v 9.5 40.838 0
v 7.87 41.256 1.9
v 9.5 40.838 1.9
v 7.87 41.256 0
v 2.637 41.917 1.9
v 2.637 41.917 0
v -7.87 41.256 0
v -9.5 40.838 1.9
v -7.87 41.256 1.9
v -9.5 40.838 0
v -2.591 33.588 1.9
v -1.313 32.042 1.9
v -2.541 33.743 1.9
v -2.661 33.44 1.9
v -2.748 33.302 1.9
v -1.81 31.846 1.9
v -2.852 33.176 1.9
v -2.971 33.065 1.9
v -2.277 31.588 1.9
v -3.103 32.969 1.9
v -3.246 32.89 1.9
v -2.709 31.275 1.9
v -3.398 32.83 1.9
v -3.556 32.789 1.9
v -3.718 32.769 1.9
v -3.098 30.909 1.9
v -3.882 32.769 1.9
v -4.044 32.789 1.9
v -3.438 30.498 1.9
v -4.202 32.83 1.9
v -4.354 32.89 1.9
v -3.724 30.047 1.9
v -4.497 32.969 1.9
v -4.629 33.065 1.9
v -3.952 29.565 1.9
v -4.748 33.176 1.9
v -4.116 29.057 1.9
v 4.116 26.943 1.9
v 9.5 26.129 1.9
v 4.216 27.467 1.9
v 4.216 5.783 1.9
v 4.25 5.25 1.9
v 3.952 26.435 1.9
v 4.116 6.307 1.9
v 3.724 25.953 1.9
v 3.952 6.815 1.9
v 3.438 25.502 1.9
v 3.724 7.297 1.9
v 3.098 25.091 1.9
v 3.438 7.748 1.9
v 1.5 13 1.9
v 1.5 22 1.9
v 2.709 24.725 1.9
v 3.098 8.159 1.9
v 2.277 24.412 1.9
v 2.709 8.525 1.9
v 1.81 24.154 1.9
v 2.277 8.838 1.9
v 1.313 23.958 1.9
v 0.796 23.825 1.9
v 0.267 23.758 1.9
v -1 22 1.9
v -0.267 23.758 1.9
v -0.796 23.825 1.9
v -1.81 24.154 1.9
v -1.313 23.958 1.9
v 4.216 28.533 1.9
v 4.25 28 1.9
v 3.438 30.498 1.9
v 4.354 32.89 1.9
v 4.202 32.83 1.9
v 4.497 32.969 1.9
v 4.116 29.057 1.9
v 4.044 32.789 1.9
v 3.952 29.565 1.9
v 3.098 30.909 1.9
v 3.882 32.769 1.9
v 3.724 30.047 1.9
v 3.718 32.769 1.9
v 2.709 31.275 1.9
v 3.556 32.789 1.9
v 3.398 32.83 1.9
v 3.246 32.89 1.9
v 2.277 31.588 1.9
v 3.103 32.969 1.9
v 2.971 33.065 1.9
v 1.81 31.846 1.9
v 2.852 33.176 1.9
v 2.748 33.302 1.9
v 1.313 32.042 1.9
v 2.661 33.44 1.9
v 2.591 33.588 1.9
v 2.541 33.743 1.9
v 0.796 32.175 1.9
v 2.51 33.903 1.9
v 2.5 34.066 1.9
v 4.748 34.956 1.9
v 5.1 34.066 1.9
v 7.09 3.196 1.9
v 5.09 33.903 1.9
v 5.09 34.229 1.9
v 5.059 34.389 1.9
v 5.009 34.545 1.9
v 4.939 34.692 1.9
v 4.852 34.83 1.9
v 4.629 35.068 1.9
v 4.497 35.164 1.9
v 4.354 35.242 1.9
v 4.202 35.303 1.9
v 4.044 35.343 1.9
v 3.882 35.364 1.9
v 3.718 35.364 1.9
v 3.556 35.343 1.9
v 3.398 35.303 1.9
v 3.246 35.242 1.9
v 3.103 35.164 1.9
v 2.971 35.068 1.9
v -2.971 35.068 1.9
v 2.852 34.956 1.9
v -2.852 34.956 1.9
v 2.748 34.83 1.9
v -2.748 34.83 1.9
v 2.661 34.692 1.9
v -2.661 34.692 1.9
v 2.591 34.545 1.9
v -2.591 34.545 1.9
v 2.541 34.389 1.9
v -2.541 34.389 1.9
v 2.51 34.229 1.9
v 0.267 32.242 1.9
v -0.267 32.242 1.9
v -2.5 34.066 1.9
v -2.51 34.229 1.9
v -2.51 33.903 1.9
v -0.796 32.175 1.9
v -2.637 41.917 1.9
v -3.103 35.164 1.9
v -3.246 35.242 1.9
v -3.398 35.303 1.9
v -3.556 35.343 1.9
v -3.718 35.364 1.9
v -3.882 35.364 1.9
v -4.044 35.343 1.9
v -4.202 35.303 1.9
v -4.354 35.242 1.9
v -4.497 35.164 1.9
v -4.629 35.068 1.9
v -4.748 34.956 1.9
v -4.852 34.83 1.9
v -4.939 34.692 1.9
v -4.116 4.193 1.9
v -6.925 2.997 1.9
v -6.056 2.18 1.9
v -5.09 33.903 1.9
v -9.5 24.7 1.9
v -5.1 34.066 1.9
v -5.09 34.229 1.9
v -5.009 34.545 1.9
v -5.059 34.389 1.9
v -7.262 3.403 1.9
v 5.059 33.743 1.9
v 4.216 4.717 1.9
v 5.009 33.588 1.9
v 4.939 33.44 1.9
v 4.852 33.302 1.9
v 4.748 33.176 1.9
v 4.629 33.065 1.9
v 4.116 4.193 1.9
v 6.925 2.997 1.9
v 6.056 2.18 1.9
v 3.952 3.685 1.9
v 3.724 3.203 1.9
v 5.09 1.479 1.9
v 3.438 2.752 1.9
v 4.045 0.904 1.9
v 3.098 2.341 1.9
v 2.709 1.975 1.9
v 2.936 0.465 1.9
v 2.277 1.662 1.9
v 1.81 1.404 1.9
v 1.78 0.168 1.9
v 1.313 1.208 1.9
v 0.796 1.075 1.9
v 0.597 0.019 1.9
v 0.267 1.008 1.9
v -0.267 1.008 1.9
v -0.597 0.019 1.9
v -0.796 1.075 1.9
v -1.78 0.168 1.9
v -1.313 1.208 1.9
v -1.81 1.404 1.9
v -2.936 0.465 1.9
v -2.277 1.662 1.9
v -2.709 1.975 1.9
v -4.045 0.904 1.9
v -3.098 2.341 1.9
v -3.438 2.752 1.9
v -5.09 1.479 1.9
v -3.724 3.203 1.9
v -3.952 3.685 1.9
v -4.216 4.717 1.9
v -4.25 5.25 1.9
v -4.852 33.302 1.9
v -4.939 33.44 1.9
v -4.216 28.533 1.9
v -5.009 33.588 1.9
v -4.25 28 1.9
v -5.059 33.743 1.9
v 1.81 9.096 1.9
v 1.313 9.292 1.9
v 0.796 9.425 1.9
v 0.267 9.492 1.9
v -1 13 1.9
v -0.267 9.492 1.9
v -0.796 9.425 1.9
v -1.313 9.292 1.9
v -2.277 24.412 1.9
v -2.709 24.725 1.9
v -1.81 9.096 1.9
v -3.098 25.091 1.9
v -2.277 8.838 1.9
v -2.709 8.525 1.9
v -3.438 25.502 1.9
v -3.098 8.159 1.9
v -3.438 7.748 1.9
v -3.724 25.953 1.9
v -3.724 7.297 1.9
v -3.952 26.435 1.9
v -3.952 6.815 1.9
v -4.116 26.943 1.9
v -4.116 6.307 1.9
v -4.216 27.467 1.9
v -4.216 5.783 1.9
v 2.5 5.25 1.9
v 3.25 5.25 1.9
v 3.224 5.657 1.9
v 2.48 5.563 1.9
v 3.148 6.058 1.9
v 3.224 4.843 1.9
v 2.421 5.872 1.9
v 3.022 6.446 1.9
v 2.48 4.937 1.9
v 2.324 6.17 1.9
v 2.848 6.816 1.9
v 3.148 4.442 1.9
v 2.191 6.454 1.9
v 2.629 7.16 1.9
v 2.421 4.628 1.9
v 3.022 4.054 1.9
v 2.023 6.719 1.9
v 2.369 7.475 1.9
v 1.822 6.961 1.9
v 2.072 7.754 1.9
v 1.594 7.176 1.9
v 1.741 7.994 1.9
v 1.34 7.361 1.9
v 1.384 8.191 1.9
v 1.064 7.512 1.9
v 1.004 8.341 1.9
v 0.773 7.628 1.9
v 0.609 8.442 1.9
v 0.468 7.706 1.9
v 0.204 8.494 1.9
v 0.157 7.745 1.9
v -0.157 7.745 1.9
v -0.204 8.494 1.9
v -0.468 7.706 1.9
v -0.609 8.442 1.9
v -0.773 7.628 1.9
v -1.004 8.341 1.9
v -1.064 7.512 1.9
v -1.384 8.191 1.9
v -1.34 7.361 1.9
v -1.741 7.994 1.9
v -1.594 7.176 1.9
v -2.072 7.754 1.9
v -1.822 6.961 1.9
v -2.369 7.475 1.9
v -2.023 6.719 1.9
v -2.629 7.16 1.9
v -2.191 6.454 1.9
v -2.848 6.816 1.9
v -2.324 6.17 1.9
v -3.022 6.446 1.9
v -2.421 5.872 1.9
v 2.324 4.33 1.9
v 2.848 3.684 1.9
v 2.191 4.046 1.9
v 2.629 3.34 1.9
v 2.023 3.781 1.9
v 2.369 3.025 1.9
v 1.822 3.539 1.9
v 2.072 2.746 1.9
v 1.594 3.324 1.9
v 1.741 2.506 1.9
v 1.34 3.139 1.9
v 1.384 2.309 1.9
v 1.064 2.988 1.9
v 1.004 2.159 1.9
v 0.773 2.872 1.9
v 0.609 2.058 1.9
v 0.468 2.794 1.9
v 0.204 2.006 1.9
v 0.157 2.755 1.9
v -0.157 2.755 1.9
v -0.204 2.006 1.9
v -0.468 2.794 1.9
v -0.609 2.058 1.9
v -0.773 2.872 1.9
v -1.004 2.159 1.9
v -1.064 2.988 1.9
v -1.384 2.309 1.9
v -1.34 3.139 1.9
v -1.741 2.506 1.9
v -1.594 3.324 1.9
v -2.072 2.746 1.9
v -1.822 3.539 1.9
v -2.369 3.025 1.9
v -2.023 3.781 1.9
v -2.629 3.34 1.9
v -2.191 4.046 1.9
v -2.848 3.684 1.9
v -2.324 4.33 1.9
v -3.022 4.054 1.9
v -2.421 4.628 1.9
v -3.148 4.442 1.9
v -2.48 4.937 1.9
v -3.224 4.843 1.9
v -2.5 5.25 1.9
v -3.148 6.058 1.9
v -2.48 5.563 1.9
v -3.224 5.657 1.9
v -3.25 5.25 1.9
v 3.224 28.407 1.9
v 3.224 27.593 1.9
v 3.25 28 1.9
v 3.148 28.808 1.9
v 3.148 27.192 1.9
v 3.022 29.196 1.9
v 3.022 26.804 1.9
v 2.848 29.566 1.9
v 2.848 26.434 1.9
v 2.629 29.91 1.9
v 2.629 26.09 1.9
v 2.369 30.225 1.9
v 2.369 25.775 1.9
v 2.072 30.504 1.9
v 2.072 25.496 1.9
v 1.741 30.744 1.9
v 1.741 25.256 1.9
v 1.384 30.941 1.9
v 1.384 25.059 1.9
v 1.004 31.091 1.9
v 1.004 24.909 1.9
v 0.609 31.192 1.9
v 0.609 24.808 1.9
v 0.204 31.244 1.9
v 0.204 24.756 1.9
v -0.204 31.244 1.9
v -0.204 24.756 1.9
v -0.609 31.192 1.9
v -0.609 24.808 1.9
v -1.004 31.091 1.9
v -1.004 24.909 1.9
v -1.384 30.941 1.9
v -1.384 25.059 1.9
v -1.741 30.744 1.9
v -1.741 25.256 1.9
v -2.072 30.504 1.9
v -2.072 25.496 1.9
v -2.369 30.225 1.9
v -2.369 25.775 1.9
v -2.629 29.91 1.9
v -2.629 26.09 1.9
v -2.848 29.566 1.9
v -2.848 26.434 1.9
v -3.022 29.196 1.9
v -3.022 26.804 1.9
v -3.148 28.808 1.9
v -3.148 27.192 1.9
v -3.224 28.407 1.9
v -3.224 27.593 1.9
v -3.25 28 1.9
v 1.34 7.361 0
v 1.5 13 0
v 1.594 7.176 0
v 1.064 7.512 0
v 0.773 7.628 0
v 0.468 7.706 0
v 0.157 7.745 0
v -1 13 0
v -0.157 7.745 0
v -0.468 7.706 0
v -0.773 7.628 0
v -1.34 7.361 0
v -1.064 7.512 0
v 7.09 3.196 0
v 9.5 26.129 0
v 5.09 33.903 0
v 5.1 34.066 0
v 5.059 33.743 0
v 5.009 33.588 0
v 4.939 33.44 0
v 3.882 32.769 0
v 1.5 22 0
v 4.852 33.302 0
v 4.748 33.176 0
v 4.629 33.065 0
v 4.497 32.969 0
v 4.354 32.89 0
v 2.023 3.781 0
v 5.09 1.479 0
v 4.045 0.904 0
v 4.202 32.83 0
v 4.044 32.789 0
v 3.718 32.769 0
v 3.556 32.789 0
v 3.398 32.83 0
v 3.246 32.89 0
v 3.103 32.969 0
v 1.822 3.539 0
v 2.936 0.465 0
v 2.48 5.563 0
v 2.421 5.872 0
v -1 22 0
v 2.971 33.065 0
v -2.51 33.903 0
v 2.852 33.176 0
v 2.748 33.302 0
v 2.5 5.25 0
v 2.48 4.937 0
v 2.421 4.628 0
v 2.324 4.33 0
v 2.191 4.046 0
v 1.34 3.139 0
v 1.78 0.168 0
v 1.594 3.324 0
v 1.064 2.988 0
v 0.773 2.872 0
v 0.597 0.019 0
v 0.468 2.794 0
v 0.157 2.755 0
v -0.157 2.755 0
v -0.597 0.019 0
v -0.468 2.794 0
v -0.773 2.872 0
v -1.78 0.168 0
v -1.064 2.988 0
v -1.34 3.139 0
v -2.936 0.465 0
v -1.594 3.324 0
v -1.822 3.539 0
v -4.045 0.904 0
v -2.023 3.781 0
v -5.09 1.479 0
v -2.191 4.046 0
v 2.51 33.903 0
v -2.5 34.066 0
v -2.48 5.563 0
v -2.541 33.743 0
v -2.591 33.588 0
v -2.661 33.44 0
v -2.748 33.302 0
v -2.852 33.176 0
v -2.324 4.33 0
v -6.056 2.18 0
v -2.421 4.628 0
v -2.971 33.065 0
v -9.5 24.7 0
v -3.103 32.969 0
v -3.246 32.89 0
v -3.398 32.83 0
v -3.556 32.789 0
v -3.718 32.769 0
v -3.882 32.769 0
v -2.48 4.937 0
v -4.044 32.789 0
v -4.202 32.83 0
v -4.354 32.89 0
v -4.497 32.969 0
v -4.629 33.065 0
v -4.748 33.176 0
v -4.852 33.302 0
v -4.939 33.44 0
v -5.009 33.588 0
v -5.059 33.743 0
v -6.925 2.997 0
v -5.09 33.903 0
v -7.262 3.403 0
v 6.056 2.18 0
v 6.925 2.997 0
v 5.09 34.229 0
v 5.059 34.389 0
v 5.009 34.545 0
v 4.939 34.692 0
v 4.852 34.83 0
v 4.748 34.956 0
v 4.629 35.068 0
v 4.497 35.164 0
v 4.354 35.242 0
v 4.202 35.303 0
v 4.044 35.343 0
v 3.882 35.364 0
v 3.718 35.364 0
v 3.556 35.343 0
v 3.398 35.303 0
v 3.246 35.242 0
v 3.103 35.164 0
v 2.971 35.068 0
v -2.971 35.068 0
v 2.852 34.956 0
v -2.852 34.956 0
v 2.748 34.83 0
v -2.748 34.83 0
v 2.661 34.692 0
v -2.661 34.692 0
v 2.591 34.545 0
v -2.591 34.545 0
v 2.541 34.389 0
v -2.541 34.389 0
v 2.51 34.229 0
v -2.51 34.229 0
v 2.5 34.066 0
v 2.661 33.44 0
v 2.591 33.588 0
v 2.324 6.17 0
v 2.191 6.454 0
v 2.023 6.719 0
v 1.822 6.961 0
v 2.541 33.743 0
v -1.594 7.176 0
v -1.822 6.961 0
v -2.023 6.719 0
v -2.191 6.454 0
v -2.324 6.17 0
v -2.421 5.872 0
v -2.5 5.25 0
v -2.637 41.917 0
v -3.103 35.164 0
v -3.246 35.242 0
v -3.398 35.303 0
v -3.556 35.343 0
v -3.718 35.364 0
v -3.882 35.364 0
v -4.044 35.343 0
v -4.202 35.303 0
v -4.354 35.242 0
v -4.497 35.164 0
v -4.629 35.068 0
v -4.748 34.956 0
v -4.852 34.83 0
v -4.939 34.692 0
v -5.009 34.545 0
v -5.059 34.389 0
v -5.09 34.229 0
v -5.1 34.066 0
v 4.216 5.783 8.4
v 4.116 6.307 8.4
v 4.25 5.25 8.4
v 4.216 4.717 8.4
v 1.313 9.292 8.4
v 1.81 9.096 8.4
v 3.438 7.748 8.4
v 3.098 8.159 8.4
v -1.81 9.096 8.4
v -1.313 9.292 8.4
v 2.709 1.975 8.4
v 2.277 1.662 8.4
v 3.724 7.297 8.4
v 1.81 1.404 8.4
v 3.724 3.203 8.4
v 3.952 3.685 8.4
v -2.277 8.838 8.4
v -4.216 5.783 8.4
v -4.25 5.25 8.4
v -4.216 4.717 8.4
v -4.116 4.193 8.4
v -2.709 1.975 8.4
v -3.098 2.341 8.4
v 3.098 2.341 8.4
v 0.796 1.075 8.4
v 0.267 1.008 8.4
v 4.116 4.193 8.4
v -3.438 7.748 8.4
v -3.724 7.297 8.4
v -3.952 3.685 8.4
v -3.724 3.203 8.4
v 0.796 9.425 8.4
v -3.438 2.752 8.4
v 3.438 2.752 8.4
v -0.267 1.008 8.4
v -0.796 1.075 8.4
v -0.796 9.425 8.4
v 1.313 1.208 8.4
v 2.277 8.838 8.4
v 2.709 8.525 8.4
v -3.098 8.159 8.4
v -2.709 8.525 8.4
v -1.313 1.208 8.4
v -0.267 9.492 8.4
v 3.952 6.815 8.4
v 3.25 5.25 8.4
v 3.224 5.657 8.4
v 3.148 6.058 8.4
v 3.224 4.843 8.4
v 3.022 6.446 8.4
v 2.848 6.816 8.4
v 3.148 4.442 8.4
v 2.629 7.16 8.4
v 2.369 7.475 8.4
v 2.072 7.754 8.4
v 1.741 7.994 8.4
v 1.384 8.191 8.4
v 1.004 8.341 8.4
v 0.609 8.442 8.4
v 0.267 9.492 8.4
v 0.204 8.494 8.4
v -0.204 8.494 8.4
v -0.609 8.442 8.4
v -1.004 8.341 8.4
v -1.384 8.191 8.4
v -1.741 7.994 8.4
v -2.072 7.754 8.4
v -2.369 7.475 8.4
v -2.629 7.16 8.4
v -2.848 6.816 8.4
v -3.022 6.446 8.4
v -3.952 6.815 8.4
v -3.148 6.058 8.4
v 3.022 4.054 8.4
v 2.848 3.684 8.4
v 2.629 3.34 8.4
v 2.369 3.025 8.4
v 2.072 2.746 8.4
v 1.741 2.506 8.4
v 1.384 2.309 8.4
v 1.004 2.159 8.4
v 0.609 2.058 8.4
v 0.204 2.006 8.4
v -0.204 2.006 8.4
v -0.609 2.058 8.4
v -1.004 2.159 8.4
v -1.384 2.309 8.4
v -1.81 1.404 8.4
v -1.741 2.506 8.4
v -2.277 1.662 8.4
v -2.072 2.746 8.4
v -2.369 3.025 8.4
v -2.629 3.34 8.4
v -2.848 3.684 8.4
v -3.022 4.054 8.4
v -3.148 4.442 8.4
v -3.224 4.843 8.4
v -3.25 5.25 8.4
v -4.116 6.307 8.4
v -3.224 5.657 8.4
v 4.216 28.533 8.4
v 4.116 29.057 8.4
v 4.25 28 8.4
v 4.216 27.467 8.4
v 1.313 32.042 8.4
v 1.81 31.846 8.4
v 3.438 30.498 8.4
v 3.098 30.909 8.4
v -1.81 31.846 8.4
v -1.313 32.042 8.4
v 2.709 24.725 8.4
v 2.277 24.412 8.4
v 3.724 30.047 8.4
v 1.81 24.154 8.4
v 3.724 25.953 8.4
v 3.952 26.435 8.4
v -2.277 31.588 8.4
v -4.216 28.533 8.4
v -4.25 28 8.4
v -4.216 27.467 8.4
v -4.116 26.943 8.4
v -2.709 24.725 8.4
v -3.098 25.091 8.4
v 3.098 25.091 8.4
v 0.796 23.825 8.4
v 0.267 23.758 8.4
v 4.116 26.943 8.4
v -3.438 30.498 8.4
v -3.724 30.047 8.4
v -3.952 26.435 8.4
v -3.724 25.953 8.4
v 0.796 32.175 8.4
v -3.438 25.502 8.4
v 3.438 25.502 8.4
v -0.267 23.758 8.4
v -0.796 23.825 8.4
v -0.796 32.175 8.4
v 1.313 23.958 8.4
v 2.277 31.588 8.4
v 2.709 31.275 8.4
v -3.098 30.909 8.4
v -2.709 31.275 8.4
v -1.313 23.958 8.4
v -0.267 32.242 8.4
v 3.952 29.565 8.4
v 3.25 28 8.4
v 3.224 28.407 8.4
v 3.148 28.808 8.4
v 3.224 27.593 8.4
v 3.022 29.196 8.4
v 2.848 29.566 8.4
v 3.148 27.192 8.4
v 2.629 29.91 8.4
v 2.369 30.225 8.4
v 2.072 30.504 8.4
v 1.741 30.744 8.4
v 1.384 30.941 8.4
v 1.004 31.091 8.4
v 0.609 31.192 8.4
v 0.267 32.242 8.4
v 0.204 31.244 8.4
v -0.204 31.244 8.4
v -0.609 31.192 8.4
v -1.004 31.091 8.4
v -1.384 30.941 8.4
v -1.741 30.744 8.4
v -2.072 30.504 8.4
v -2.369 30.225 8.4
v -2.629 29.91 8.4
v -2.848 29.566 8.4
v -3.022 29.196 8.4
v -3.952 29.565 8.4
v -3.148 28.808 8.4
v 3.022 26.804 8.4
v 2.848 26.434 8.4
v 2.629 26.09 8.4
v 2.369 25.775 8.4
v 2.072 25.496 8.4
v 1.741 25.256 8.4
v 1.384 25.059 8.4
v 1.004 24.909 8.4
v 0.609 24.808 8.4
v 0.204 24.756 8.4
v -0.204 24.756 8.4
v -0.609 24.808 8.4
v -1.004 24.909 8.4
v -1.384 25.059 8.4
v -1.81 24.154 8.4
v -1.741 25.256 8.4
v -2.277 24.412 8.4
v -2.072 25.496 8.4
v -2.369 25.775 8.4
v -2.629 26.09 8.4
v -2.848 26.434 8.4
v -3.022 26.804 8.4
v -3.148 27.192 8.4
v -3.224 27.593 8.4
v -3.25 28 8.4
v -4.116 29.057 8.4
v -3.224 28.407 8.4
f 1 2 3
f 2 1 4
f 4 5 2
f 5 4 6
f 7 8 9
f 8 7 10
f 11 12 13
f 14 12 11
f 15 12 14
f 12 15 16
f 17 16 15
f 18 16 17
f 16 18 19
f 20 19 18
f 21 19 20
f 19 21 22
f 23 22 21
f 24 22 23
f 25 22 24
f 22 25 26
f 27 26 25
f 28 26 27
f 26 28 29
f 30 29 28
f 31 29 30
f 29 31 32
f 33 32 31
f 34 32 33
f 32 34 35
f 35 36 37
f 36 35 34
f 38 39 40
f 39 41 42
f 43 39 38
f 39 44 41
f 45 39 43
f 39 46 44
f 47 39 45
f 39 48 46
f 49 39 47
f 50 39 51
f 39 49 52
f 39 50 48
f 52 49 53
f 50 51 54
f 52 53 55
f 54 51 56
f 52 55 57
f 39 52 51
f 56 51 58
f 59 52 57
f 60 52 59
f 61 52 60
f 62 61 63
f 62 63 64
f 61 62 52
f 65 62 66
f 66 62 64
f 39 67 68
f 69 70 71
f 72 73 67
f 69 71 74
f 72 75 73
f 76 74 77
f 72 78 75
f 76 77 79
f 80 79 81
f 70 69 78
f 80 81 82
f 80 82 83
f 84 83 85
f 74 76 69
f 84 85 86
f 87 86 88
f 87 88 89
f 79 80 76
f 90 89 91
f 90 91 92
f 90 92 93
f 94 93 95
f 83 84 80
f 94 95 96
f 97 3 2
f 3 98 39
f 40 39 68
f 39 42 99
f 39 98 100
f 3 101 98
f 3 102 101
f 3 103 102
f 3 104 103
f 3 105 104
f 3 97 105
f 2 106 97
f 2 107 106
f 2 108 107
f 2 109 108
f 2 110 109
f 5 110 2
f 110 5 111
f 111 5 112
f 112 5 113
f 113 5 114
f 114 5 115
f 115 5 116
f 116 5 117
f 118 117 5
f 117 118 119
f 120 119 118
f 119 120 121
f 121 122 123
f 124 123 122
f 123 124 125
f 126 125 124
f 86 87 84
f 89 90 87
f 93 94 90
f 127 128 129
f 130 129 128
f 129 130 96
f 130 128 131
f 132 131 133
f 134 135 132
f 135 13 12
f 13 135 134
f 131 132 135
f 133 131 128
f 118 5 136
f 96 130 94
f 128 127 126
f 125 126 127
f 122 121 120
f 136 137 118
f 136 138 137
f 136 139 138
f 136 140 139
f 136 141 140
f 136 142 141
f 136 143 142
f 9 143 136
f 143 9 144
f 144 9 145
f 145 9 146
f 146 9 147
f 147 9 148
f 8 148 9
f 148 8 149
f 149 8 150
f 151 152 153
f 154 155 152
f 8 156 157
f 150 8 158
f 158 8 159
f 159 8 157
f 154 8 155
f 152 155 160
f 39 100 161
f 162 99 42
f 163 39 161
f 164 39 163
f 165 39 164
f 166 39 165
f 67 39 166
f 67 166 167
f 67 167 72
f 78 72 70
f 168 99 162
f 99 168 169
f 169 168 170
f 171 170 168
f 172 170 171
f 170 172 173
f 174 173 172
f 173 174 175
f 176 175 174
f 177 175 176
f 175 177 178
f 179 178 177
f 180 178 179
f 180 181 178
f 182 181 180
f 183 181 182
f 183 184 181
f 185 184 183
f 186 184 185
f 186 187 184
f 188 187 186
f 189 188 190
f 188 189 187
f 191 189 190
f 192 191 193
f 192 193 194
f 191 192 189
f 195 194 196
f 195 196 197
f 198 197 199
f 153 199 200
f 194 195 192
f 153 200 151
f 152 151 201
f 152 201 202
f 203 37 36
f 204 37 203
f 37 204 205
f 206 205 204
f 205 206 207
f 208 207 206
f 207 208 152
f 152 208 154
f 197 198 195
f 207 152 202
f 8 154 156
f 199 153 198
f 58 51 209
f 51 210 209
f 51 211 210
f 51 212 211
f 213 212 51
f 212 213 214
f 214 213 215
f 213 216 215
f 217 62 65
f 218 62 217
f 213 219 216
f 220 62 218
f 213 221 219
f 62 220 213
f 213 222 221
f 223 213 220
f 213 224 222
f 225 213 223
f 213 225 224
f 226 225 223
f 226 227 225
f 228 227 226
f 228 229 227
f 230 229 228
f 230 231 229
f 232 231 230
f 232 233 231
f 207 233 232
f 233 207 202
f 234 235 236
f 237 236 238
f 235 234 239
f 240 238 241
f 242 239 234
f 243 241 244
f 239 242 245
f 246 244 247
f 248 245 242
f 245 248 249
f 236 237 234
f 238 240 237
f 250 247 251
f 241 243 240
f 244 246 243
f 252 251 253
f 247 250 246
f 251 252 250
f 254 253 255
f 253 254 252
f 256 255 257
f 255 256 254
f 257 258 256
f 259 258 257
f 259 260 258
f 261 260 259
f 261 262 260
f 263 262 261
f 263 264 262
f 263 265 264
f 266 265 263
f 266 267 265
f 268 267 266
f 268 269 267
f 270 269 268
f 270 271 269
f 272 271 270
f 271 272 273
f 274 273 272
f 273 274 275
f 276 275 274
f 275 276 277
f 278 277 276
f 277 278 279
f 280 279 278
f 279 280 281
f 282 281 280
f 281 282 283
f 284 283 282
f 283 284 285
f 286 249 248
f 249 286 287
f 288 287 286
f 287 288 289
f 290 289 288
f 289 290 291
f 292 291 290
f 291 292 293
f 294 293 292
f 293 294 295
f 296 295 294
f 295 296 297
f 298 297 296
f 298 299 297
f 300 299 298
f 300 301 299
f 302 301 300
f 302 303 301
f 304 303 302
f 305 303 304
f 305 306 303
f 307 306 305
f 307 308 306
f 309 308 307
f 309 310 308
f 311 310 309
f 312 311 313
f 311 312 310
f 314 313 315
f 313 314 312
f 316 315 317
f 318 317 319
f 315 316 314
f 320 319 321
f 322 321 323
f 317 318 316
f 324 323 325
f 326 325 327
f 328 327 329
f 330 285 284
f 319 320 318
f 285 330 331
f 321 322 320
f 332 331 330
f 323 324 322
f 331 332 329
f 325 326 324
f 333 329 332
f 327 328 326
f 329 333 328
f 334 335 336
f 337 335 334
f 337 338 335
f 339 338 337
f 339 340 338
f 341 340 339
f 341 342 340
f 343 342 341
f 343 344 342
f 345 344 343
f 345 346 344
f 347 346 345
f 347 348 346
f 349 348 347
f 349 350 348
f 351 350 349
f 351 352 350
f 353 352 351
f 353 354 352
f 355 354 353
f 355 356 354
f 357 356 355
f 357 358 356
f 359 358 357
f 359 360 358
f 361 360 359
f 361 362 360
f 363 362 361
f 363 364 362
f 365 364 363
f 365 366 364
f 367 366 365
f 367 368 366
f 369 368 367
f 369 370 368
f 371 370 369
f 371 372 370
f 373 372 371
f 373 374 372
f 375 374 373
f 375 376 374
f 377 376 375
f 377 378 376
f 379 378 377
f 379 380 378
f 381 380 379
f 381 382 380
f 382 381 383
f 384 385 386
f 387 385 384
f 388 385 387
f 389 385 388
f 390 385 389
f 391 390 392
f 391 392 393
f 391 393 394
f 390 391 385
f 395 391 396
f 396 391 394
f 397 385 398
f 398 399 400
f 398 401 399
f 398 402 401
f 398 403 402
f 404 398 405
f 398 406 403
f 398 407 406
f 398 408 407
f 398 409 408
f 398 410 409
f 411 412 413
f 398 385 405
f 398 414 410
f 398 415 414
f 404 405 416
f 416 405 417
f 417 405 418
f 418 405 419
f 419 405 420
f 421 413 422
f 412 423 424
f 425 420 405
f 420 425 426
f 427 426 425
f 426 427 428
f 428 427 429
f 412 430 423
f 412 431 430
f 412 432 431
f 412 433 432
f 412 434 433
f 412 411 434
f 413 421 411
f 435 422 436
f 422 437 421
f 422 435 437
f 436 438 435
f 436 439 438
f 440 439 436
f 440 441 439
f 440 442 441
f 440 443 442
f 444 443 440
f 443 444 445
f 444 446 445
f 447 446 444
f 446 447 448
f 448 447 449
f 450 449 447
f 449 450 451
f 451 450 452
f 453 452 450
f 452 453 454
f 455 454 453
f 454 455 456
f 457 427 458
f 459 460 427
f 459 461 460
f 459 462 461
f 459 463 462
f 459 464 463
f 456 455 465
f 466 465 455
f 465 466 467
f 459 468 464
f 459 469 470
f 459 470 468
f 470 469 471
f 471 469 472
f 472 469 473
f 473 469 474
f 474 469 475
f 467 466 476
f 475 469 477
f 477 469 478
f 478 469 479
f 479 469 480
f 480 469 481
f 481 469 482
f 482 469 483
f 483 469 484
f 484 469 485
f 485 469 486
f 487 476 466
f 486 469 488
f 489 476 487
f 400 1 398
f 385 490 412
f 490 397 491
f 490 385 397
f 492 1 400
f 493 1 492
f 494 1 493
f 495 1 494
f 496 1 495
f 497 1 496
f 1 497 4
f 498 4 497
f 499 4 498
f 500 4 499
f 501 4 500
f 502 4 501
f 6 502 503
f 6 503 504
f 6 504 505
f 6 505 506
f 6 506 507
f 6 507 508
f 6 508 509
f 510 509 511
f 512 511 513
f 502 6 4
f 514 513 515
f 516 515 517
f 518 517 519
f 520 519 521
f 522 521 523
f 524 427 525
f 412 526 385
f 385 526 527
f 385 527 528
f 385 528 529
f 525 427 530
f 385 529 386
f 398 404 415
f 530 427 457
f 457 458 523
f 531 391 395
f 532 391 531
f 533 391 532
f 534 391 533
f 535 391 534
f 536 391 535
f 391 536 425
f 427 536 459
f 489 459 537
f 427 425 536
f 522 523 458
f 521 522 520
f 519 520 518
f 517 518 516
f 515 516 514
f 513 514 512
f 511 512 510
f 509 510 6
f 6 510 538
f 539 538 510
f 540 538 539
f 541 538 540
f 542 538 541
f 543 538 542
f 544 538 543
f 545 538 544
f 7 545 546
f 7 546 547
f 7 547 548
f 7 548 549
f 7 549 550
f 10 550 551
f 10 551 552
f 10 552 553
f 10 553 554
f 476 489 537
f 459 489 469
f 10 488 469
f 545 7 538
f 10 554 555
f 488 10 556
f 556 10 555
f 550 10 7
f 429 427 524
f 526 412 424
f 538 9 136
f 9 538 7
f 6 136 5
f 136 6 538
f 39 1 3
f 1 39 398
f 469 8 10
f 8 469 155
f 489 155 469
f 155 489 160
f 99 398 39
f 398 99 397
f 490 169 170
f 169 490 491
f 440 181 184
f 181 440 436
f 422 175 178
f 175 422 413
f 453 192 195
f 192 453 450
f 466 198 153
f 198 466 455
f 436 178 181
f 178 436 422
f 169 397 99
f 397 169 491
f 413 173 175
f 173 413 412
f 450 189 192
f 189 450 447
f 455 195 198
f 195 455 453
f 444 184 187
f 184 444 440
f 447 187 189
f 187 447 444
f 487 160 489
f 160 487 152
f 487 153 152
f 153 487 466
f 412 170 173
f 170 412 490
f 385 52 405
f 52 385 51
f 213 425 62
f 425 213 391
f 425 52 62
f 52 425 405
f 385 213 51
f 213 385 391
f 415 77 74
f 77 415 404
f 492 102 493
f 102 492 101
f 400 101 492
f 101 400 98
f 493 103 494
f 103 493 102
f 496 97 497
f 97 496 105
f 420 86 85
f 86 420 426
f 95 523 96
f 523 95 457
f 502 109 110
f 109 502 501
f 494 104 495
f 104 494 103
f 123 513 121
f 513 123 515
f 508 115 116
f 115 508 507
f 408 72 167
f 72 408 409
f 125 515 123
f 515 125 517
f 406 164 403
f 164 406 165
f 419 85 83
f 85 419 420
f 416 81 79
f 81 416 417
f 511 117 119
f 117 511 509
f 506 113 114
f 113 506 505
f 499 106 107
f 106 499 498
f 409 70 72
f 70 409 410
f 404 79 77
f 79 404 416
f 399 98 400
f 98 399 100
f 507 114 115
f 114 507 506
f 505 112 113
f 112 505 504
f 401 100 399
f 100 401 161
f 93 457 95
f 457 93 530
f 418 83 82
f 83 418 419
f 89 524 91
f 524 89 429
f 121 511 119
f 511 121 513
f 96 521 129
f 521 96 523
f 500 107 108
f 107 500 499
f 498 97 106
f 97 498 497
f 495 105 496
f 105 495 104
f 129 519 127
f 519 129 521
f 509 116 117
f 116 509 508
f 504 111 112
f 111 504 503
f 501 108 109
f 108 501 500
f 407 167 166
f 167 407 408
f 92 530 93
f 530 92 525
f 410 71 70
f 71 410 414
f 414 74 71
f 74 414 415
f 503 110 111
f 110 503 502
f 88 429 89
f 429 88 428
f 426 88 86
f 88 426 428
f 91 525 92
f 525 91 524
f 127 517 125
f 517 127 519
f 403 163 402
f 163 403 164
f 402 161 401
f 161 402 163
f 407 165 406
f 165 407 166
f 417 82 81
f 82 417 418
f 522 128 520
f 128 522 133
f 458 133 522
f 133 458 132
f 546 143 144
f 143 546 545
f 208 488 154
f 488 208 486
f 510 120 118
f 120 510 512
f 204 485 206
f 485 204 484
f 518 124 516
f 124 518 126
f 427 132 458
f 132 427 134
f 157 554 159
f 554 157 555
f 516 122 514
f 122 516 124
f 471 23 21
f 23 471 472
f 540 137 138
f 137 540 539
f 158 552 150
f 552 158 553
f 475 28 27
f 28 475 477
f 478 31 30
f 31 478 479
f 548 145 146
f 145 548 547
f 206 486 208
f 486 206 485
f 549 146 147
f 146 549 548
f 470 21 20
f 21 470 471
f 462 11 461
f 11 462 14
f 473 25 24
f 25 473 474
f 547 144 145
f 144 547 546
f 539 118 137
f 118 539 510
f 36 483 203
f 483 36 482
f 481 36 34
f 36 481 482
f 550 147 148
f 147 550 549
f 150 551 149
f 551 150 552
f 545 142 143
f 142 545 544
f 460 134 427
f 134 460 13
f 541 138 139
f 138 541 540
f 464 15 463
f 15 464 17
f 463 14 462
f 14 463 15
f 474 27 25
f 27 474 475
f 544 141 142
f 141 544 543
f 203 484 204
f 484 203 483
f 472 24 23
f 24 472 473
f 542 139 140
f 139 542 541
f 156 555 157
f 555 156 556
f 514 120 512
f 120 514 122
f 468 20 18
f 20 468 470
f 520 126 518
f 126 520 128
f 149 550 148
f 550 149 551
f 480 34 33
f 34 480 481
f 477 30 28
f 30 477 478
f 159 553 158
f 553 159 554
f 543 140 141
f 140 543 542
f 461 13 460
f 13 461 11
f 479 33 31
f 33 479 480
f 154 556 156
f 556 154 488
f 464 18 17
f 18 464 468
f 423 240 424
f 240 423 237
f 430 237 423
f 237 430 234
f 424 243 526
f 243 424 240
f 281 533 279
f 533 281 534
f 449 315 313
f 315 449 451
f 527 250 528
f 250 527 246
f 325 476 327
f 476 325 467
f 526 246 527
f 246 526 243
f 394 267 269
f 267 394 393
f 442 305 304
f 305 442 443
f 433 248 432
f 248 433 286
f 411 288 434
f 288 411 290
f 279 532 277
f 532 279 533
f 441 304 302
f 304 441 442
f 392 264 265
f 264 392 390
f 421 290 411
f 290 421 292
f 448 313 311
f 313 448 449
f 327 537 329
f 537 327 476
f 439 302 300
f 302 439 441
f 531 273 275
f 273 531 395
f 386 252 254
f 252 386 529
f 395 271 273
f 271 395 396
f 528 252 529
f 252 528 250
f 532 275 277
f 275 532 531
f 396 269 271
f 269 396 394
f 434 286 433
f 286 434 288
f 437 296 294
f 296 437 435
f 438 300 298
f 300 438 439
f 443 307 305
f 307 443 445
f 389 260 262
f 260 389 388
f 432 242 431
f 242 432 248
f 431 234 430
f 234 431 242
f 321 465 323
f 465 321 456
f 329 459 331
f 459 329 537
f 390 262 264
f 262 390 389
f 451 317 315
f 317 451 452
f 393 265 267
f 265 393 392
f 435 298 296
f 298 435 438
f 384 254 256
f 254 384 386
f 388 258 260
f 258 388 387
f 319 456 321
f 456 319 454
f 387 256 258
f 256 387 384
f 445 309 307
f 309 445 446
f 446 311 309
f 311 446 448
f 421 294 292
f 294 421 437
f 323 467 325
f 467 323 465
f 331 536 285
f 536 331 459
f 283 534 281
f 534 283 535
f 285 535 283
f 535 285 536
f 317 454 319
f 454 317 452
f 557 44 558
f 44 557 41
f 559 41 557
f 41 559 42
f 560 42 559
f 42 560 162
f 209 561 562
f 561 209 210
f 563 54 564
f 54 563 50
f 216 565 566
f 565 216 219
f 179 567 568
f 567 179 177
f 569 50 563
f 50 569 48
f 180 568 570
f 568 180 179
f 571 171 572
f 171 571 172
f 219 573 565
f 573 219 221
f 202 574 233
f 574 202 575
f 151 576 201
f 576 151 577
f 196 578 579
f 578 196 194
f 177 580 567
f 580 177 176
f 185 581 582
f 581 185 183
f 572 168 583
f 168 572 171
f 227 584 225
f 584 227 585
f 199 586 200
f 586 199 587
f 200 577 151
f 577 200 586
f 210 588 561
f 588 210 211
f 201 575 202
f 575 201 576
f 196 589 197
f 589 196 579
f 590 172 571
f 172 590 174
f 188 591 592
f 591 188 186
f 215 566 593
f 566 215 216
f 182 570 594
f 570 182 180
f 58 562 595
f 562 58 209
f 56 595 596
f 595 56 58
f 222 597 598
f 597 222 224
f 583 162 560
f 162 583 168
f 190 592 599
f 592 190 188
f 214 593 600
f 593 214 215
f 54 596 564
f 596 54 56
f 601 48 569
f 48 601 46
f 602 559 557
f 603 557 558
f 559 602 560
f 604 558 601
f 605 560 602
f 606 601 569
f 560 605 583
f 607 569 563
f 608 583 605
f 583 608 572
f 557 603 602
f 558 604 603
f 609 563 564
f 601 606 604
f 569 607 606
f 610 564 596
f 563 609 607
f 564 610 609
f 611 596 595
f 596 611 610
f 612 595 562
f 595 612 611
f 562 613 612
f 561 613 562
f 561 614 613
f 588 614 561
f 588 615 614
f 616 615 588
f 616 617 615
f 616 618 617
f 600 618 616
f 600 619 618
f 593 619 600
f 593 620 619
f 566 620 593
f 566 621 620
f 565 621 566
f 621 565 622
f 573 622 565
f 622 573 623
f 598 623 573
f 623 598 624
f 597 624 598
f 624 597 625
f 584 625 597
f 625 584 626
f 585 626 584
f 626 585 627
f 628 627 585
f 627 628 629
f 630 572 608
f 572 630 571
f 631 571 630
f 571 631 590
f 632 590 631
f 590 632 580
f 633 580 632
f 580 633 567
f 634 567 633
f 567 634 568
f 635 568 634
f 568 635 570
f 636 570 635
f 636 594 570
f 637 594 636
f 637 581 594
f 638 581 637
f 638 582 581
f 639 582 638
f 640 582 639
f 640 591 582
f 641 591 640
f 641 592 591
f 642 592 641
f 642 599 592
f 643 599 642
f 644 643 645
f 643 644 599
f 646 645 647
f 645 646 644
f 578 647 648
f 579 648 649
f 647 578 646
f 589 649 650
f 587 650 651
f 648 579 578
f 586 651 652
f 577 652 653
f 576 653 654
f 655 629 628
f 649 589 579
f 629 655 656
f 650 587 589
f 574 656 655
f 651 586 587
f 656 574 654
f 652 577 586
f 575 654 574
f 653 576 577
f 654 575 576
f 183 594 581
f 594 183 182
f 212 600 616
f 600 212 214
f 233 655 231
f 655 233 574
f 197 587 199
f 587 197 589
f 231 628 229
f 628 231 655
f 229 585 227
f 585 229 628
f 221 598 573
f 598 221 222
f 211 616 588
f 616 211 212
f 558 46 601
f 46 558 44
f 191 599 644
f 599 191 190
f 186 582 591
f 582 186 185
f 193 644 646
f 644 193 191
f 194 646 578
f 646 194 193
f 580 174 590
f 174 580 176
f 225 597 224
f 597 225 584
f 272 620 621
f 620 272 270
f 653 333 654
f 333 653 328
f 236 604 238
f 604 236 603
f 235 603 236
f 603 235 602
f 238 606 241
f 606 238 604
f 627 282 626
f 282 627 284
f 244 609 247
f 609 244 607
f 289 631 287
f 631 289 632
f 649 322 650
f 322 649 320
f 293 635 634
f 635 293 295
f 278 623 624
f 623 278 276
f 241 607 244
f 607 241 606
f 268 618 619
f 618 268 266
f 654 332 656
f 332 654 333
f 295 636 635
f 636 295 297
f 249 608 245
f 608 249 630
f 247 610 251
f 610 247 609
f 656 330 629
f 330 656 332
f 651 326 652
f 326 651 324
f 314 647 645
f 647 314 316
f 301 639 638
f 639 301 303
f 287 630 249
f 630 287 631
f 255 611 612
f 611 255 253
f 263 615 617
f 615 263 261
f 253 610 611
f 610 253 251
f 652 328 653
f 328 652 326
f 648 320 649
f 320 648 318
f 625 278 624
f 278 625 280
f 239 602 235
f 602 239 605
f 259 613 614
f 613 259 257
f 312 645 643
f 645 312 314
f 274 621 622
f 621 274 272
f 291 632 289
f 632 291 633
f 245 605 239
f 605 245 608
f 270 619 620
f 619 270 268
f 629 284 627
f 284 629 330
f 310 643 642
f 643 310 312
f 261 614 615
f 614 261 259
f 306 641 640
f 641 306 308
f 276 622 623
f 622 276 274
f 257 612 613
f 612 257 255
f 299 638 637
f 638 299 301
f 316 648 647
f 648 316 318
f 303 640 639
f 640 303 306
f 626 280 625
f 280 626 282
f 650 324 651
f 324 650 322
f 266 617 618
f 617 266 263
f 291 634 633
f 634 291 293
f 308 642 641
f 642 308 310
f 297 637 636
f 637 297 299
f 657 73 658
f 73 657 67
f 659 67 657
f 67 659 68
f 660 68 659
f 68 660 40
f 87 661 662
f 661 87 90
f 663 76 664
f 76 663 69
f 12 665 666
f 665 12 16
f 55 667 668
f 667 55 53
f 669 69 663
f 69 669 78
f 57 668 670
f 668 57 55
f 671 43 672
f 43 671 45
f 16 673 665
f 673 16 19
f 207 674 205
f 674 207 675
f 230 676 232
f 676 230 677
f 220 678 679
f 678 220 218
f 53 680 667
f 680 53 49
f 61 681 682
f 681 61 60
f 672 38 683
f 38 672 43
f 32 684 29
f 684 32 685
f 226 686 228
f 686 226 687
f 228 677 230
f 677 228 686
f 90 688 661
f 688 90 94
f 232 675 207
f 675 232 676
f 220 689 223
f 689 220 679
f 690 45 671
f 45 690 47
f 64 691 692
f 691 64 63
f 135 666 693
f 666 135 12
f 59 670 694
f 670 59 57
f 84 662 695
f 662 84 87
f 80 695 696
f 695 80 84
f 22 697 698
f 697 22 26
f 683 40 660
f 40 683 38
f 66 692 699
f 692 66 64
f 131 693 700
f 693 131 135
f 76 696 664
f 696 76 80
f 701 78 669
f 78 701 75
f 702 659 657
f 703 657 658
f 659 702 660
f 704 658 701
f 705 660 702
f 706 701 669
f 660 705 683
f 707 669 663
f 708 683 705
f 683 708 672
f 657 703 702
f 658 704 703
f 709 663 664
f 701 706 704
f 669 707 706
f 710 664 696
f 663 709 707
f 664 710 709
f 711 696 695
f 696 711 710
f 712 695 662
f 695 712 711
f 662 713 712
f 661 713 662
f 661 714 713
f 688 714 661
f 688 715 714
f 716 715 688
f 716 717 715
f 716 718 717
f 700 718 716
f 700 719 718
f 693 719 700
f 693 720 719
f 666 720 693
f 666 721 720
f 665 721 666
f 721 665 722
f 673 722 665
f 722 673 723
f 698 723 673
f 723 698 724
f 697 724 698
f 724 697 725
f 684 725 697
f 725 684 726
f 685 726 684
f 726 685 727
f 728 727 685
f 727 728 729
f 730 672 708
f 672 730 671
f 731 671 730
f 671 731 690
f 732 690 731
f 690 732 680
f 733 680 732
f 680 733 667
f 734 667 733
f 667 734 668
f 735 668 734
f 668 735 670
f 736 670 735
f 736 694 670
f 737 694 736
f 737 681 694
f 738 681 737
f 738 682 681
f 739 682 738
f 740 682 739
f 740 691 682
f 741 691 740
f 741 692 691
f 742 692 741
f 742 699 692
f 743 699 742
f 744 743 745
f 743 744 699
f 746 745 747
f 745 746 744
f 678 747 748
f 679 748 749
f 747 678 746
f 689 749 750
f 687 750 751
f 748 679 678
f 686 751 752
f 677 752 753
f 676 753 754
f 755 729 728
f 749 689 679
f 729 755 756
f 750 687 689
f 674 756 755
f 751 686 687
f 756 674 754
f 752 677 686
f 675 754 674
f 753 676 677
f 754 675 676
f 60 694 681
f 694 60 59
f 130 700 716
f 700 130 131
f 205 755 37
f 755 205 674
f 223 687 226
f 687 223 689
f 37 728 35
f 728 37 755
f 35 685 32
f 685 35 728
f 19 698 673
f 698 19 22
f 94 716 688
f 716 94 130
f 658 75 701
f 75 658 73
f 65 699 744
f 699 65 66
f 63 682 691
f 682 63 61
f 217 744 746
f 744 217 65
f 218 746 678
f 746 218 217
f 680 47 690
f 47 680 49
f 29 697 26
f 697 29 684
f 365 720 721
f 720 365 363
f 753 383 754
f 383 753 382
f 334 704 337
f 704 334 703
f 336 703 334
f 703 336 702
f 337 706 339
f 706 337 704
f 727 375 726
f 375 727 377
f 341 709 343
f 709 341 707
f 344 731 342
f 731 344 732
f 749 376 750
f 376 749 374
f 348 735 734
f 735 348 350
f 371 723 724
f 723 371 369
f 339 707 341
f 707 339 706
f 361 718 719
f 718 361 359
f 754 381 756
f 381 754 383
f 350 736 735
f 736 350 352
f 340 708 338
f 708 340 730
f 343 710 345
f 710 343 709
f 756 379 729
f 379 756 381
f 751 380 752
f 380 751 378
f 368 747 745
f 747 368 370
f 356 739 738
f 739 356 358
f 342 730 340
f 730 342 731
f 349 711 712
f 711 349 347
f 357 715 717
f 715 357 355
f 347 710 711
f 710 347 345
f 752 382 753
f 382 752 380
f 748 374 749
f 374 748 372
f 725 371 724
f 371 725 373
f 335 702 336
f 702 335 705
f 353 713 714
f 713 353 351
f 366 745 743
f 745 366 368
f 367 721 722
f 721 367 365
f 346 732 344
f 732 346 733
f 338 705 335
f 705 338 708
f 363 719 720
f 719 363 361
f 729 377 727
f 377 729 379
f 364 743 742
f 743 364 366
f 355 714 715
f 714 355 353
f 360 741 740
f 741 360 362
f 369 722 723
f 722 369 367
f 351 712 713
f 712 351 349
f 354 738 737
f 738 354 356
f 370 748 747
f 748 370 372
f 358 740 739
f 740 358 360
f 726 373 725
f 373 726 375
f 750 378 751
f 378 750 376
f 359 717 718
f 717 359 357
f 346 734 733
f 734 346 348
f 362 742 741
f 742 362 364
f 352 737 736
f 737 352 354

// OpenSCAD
// Copyright 2020,2024 Martin Scheidt (Attribution 4.0 International, CC-BY 4.0)
//
// You are free to copy and redistribute the material in any medium or format.
// You are free to remix, transform, and build upon the material for any purpose, even commercially.
// You must give appropriate credit, provide a link to the license, and indicate if changes were made.
// You may not apply legal terms or technological measures that legally restrict others from doing anything the license permits.
// No warranties are given.

include<./specification_of_components.scad>

$fn = 50;// number of fragments

module switch_blade(thickness){ union(){
    difference(){
        intersection(){
            cylinder(r = blade_length, h = thickness);
            translate([-blade_width/2,0,0]) cube([blade_width,blade_length,thickness]); //why pin diameter in translate?
        };
        // flank left
        translate([-blade_width/2,-4,-thickness/4]) rotate(a=[0,0,6]) cube([3,blade_length,thickness*2]);
        // flank right
        translate([blade_width/3,-4,-thickness/4]) rotate(a=[0,0,-6]) cube([3,blade_length,thickness*2]);
    };
};
};

module lever_anchor(){
    cylinder(d = lever_hole_size, h = blade_thickness);
};

module cap_notch(male=true){
    if(male==true){
        cube([2,y_pos_second_pin-3*pin_diameter,blade_thickness/2+blade_cover_thicknes]);
    };
    if(male==false){
        cube([2+move_tolerance,y_pos_second_pin-3*pin_diameter+move_tolerance,blade_thickness]);
    };
};

module hole_for_om_pin(){
    cylinder(d=om_pin_diameter+move_tolerance, h=pin_height+overlap);
}

module pin(){
    difference(){
        cylinder(d = pin_diameter, h = pin_height);
        hole_for_om_pin();
    }
};


module pin_hole(){ union(){
    difference(){
        cylinder(d = pin_female_diameter, h = pin_height+overlap); //pin_diameter*1.3
        cylinder(d = pin_diameter, h = pin_height+overlap);
    };
};
};

module base_rounding(){
    difference(){
        translate([-blade_width/2,-blade_width/2,0]) cube([blade_width,blade_width,blade_thickness]);
        translate([0,blade_width/2,0]) cylinder(h=blade_thickness, d=blade_width);
//        translate([-blade_width/2,-(blade_width-y_pos_first_pin),0]) cube([blade_width,blade_width,blade_thickness]);
//        scale([1.5,1,1]) translate([0,y_pos_first_pin,0]) cylinder(h=blade_thickness, r=y_pos_first_pin);
    }
}

module switch_male(){ union(){
    difference(){
        switch_blade(blade_thickness);
        // lever_anchor
        translate([lever_anchor_posX,lever_anchor_posY, blade_cover_thicknes]) lever_anchor();
        translate([-lever_anchor_posX,lever_anchor_posY, blade_cover_thicknes]) lever_anchor();
        translate([0,y_pos_first_pin,0]) hole_for_om_pin();
    };
    translate([0,y_pos_first_pin,blade_thickness]) pin();
    translate([0,y_pos_second_pin,blade_thickness]) pin();
    
};
};

module switch_female(){ union(){
    difference(){
        switch_blade(blade_thickness-blade_cover_thicknes);
        //cap notch
        translate([-1,2*pin_diameter,0]) cap_notch(male=false);
        // lever_anchor
        translate([lever_anchor_posX,lever_anchor_posY,0]) lever_anchor();
        translate([-lever_anchor_posX,lever_anchor_posY,0]) lever_anchor();
        translate([0,y_pos_first_pin,0]) hole_for_om_pin();
        base_rounding();
    };
    translate([0,y_pos_first_pin,0]) pin_hole(); //Theoretically, the hole should be seen at the bottom
    translate([0,y_pos_second_pin,0]) pin_hole(); 
};
};

module cap(){ union(){
    difference(){union(){
    switch_blade(blade_cover_thicknes);
    translate([-1,2*pin_diameter,0]) cap_notch(male=true);
    }
    translate([0,y_pos_first_pin,0]) hole_for_om_pin();
    }
};
};

module print_to_console(){
    echo("pin_diameter*0.3", pin_diameter*0.3);
}
print_to_console();

//base_rounding();
switch_female();
//color("LightBlue") translate([(blade_width+2)/2,15,0]) rotate(a=[0,0,180]) switch_male();
//color("LightGreen") translate([-(blade_width+2)/2,-15,0]) switch_female();
//color("green") translate([-(blade_width+2)*1.5,15,0]) rotate(a=[0,0,180]) cap();



//pin();
//lever_anchor();
//switch_blade();
